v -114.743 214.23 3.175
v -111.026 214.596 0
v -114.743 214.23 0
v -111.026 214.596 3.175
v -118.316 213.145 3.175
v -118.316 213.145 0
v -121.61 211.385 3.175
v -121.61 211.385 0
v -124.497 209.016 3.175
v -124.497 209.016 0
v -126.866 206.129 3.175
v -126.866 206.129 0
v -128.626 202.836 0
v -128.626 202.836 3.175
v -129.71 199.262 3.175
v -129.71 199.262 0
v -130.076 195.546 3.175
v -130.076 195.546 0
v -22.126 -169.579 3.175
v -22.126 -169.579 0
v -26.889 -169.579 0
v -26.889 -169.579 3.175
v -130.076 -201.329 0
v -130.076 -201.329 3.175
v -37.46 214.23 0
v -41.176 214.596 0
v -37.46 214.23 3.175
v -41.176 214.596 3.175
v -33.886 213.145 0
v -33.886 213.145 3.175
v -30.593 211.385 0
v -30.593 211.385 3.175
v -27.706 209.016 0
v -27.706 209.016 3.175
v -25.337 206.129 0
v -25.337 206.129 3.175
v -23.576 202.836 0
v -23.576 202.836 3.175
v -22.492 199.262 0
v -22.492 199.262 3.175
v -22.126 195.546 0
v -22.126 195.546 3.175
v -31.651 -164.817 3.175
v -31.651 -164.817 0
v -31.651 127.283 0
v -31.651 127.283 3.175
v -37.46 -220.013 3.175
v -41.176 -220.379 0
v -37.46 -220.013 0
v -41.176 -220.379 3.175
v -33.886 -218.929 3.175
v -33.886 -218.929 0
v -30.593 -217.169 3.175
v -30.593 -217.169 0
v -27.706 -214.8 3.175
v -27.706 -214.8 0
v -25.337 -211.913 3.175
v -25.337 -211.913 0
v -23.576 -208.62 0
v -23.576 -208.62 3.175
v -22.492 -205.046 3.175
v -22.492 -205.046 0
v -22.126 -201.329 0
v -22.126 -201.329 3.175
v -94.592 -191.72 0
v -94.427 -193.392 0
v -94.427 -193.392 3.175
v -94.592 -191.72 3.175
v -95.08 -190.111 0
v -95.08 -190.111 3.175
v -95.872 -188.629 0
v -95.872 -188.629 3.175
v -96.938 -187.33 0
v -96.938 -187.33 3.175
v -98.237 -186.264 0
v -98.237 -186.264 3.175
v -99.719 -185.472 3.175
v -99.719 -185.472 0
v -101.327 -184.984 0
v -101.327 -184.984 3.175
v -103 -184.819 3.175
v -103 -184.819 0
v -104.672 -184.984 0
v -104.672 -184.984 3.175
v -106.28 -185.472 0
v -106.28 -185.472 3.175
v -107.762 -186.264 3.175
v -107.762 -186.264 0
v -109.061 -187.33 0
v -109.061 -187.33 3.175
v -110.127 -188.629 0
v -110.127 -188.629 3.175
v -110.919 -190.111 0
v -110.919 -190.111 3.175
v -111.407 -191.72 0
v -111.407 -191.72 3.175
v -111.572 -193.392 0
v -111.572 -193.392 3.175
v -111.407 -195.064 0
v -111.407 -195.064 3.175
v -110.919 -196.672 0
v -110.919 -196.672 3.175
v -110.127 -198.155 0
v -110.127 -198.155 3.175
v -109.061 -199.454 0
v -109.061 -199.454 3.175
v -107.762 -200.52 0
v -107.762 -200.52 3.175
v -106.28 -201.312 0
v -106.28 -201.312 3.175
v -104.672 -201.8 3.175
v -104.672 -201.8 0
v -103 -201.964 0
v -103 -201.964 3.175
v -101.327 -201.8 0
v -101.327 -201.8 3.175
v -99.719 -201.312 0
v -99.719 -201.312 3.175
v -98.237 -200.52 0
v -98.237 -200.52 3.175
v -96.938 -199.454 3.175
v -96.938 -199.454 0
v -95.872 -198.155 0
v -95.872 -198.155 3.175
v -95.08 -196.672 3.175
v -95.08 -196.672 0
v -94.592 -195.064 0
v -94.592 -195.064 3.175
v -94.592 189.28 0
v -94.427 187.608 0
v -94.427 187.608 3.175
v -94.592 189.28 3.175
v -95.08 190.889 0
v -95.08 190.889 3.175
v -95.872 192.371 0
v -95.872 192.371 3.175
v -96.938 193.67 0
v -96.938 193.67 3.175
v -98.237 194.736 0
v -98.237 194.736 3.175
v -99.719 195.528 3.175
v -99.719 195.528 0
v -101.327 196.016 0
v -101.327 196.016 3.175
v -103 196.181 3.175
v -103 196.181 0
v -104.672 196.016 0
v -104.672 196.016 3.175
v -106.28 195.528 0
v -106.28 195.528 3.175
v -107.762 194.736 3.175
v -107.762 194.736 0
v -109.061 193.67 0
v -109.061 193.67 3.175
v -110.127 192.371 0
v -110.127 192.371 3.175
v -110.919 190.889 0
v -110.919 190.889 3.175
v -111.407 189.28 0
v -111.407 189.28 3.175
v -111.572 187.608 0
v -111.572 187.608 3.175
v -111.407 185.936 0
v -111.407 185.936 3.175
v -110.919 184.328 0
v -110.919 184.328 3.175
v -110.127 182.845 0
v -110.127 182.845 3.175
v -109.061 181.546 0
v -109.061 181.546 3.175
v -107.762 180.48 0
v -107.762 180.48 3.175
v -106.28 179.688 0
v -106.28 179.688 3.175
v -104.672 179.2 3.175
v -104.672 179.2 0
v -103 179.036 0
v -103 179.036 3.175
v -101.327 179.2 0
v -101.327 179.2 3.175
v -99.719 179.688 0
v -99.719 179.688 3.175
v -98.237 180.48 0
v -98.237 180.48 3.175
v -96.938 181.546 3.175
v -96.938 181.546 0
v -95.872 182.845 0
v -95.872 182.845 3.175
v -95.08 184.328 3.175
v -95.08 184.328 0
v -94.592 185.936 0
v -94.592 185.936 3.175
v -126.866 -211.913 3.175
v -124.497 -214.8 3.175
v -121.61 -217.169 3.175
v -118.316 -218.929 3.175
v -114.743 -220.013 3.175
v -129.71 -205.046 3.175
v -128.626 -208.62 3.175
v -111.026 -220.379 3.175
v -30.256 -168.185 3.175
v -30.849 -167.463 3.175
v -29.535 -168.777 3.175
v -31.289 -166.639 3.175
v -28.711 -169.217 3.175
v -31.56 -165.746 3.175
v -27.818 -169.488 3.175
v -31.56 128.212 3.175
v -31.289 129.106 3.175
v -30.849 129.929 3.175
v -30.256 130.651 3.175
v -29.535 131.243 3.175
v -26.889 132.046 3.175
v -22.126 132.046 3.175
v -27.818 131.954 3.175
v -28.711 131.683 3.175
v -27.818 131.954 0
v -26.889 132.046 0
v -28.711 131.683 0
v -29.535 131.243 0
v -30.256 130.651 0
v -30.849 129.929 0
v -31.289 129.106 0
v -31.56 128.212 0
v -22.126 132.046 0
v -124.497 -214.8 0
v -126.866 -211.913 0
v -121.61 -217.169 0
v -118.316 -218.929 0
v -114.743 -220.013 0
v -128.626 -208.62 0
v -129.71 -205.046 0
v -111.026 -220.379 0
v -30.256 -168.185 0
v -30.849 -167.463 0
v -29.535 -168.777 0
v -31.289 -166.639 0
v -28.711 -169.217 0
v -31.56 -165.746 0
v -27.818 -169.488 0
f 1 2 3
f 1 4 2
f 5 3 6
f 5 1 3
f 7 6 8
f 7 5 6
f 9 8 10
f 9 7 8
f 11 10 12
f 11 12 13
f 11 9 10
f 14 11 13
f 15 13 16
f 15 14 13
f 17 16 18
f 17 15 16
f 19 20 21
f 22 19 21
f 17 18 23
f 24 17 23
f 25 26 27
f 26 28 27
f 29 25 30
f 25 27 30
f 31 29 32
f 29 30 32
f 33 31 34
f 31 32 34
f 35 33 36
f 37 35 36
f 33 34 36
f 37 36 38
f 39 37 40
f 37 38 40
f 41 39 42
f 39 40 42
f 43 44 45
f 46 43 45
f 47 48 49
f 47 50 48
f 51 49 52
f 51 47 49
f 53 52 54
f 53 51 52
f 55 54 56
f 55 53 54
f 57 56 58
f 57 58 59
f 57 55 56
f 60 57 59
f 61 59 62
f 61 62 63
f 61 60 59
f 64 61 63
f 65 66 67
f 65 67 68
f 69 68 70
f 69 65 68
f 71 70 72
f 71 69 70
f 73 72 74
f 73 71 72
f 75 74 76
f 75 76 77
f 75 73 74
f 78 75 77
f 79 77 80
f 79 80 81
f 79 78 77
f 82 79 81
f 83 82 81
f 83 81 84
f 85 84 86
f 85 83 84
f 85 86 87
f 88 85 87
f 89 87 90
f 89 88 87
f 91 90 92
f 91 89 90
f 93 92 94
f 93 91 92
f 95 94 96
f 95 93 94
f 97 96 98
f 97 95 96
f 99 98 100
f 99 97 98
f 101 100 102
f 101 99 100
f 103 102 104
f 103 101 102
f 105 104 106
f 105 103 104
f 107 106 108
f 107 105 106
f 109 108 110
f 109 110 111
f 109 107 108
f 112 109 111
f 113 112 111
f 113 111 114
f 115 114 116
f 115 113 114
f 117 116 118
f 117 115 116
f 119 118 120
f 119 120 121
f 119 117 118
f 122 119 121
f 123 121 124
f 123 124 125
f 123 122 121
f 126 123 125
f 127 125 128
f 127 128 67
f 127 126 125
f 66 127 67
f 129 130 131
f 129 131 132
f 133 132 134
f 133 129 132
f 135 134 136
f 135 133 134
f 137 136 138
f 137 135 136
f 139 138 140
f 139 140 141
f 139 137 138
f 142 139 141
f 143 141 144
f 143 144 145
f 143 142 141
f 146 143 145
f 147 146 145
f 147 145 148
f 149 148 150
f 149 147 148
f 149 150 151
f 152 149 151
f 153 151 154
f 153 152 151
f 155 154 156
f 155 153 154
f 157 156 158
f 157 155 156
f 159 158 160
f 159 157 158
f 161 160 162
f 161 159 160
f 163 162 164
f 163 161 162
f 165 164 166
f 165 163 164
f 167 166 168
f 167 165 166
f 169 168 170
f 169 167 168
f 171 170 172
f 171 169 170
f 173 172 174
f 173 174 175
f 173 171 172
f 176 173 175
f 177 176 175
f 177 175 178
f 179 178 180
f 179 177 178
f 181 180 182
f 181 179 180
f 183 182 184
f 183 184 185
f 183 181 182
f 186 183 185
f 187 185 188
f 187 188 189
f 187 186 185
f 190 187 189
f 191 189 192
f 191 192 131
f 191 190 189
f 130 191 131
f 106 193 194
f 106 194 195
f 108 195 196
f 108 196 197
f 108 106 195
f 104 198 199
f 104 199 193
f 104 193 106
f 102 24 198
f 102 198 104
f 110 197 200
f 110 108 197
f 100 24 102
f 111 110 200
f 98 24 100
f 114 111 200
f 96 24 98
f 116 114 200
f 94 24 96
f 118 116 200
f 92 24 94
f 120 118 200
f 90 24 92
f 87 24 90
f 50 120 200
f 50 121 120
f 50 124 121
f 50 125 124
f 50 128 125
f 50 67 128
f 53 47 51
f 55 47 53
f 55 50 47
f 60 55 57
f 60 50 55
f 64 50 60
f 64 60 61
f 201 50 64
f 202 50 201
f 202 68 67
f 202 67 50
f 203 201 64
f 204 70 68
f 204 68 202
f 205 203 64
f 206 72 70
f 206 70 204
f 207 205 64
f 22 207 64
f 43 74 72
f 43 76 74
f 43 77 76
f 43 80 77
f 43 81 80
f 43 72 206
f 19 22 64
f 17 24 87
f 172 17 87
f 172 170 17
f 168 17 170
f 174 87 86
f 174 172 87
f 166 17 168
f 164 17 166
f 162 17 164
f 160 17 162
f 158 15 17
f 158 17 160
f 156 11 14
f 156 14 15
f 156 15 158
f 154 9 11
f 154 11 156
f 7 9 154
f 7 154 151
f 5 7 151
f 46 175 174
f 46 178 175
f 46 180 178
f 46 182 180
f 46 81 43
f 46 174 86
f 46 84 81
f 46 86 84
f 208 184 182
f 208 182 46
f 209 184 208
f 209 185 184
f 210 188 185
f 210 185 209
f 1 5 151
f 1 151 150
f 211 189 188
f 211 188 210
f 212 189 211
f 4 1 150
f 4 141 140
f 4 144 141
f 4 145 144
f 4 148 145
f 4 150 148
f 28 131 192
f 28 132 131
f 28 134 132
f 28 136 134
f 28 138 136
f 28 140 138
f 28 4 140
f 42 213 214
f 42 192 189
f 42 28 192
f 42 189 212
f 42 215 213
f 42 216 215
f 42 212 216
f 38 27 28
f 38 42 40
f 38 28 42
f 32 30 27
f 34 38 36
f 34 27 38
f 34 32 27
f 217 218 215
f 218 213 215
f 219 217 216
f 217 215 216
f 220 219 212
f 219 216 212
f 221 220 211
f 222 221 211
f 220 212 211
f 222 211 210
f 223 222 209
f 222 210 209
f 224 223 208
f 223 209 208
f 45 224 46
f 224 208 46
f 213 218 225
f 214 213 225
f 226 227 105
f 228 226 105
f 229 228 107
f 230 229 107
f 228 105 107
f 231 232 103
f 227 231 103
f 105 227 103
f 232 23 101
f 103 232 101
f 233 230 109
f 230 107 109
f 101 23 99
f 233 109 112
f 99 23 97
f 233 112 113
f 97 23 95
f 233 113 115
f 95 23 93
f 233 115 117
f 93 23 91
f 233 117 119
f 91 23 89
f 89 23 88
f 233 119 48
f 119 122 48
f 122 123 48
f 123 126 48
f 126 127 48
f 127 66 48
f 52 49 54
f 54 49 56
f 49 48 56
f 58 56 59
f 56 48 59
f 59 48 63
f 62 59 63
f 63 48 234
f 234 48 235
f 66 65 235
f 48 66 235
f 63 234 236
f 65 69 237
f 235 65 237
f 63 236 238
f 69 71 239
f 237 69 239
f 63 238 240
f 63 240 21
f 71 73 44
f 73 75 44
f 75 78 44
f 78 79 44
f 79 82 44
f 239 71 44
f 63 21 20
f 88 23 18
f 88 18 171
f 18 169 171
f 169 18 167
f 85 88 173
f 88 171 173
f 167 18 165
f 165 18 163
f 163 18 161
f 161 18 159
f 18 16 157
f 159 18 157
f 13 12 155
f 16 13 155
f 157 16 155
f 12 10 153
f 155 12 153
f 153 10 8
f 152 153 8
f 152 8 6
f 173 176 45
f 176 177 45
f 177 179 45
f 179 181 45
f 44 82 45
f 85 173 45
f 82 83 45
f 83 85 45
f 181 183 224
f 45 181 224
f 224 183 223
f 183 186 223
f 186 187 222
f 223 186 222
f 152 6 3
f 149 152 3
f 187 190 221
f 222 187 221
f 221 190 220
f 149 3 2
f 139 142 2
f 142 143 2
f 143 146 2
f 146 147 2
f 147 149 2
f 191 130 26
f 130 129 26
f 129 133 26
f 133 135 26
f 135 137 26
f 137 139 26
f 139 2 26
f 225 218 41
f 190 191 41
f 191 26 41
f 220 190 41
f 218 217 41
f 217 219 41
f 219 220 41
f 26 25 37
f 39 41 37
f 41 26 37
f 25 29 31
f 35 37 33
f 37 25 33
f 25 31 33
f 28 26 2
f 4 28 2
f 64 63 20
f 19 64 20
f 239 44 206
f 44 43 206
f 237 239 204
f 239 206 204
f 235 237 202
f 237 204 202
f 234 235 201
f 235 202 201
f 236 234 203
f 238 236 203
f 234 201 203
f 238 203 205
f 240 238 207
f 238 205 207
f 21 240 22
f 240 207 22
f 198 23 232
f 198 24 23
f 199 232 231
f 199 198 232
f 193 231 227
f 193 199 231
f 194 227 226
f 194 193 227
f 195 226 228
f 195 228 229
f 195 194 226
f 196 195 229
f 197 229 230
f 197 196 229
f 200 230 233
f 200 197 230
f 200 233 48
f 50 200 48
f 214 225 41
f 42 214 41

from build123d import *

# Parameters (mm, degrees)
F0_R     = 8.5725
F1_DEPTH = 3.175
F2_R     = 19.05
F3_R     = 4.7625


with BuildPart() as f1:
    # F0 (on Top) → F1 (new body)
    with BuildSketch(Plane.XY):
        Polygon((-22.126334, 214.595574), (-130.076334, 214.595574), (-130.076334, -220.379426), (-22.126334, -220.379426), (-22.126334, -169.579426), (-31.651334, -169.579426), (-31.651334, 132.045574), (-22.126334, 132.045574), align=None)
        with Locations((-102.999538, -193.391926)):
            Circle(F0_R, mode=Mode.SUBTRACT)
        with Locations((-102.999538, 187.608074)):
            Circle(F0_R, mode=Mode.SUBTRACT)
    extrude(amount=F1_DEPTH)

    # F2
    f2_edges = [f1.edges().sort_by_distance(p)[0] for p in [
        (-130.076334, -220.379426, 1.5875),
        (-22.126334, -220.379426, 1.5875),
        (-130.076334, 214.595574, 1.5875),
        (-22.126334, 214.595574, 1.5875),
    ]]
    fillet(f2_edges, radius=F2_R)

    # F3
    f3_edges = [f1.edges().sort_by_distance(p)[0] for p in [
        (-31.651334, -169.579426, 1.5875),
        (-31.651334, 132.045574, 1.5875),
    ]]
    fillet(f3_edges, radius=F3_R)


solid = f1.part
